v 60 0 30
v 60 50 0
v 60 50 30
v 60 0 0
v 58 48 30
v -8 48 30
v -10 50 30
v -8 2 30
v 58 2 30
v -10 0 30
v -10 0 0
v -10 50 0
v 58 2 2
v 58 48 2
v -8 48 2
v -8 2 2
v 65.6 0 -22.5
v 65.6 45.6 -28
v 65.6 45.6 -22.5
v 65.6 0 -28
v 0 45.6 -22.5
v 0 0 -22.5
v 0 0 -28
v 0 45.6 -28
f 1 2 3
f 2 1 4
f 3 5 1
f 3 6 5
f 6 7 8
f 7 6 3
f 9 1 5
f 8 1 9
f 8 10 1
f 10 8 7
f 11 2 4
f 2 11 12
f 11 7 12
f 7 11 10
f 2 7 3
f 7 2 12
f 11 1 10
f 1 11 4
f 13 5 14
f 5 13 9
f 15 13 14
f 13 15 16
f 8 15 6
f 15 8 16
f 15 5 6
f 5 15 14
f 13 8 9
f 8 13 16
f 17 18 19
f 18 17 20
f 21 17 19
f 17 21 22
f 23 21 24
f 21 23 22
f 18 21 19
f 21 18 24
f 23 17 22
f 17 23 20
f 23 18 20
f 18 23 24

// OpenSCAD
// Two-part enclosure for small electronics board
// Print orientation: both parts flat on bed, lid on +X side of box

$fn = 64;

// ---- Box ----
box_x = 70;      // outer length (X)
box_y = 50;      // outer width (Y)
box_z = 30;      // outer height (Z)
wall = 2;        // wall thickness
floor = 2;       // floor thickness

// ---- Lid ----
lip_w = 65.6;    // lip outer length (X)
lip_d = 45.6;    // lip outer width (Y)
lip_h = 4;       // lip height (Z)
lip_t = 1.5;     // lip wall thickness

// ---- Misc ----
eps = 0.5;       // cutter overshoot
gap = 10;        // gap between parts on bed

// Derived
inner_x = box_x - 2 * wall;
inner_y = box_y - 2 * wall;
lip_f  = lip_w - box_x + 0.4;  // clearance 0.2 each side
lip_d2 = lip_d - box_y + 0.4;

module box() {
    difference() {
        cube([box_x, box_y, box_z]);
        translate([wall, wall, floor])
            cube([inner_x, inner_y, box_z - floor]);
    }
}

module lid() {
    translate([0, 0, -box_z + floor + lip_h])  // sit on box top
        cube([lip_w, lip_d, lip_t]);           // lip plate
    translate([0, 0, -box_z + floor])
        cube([lip_w, lip_d, lip_h]);           // lip wall
}

union() {
    translate([-gap, 0, 0]) box();
    translate([0, 0, 0]) lid();
}
